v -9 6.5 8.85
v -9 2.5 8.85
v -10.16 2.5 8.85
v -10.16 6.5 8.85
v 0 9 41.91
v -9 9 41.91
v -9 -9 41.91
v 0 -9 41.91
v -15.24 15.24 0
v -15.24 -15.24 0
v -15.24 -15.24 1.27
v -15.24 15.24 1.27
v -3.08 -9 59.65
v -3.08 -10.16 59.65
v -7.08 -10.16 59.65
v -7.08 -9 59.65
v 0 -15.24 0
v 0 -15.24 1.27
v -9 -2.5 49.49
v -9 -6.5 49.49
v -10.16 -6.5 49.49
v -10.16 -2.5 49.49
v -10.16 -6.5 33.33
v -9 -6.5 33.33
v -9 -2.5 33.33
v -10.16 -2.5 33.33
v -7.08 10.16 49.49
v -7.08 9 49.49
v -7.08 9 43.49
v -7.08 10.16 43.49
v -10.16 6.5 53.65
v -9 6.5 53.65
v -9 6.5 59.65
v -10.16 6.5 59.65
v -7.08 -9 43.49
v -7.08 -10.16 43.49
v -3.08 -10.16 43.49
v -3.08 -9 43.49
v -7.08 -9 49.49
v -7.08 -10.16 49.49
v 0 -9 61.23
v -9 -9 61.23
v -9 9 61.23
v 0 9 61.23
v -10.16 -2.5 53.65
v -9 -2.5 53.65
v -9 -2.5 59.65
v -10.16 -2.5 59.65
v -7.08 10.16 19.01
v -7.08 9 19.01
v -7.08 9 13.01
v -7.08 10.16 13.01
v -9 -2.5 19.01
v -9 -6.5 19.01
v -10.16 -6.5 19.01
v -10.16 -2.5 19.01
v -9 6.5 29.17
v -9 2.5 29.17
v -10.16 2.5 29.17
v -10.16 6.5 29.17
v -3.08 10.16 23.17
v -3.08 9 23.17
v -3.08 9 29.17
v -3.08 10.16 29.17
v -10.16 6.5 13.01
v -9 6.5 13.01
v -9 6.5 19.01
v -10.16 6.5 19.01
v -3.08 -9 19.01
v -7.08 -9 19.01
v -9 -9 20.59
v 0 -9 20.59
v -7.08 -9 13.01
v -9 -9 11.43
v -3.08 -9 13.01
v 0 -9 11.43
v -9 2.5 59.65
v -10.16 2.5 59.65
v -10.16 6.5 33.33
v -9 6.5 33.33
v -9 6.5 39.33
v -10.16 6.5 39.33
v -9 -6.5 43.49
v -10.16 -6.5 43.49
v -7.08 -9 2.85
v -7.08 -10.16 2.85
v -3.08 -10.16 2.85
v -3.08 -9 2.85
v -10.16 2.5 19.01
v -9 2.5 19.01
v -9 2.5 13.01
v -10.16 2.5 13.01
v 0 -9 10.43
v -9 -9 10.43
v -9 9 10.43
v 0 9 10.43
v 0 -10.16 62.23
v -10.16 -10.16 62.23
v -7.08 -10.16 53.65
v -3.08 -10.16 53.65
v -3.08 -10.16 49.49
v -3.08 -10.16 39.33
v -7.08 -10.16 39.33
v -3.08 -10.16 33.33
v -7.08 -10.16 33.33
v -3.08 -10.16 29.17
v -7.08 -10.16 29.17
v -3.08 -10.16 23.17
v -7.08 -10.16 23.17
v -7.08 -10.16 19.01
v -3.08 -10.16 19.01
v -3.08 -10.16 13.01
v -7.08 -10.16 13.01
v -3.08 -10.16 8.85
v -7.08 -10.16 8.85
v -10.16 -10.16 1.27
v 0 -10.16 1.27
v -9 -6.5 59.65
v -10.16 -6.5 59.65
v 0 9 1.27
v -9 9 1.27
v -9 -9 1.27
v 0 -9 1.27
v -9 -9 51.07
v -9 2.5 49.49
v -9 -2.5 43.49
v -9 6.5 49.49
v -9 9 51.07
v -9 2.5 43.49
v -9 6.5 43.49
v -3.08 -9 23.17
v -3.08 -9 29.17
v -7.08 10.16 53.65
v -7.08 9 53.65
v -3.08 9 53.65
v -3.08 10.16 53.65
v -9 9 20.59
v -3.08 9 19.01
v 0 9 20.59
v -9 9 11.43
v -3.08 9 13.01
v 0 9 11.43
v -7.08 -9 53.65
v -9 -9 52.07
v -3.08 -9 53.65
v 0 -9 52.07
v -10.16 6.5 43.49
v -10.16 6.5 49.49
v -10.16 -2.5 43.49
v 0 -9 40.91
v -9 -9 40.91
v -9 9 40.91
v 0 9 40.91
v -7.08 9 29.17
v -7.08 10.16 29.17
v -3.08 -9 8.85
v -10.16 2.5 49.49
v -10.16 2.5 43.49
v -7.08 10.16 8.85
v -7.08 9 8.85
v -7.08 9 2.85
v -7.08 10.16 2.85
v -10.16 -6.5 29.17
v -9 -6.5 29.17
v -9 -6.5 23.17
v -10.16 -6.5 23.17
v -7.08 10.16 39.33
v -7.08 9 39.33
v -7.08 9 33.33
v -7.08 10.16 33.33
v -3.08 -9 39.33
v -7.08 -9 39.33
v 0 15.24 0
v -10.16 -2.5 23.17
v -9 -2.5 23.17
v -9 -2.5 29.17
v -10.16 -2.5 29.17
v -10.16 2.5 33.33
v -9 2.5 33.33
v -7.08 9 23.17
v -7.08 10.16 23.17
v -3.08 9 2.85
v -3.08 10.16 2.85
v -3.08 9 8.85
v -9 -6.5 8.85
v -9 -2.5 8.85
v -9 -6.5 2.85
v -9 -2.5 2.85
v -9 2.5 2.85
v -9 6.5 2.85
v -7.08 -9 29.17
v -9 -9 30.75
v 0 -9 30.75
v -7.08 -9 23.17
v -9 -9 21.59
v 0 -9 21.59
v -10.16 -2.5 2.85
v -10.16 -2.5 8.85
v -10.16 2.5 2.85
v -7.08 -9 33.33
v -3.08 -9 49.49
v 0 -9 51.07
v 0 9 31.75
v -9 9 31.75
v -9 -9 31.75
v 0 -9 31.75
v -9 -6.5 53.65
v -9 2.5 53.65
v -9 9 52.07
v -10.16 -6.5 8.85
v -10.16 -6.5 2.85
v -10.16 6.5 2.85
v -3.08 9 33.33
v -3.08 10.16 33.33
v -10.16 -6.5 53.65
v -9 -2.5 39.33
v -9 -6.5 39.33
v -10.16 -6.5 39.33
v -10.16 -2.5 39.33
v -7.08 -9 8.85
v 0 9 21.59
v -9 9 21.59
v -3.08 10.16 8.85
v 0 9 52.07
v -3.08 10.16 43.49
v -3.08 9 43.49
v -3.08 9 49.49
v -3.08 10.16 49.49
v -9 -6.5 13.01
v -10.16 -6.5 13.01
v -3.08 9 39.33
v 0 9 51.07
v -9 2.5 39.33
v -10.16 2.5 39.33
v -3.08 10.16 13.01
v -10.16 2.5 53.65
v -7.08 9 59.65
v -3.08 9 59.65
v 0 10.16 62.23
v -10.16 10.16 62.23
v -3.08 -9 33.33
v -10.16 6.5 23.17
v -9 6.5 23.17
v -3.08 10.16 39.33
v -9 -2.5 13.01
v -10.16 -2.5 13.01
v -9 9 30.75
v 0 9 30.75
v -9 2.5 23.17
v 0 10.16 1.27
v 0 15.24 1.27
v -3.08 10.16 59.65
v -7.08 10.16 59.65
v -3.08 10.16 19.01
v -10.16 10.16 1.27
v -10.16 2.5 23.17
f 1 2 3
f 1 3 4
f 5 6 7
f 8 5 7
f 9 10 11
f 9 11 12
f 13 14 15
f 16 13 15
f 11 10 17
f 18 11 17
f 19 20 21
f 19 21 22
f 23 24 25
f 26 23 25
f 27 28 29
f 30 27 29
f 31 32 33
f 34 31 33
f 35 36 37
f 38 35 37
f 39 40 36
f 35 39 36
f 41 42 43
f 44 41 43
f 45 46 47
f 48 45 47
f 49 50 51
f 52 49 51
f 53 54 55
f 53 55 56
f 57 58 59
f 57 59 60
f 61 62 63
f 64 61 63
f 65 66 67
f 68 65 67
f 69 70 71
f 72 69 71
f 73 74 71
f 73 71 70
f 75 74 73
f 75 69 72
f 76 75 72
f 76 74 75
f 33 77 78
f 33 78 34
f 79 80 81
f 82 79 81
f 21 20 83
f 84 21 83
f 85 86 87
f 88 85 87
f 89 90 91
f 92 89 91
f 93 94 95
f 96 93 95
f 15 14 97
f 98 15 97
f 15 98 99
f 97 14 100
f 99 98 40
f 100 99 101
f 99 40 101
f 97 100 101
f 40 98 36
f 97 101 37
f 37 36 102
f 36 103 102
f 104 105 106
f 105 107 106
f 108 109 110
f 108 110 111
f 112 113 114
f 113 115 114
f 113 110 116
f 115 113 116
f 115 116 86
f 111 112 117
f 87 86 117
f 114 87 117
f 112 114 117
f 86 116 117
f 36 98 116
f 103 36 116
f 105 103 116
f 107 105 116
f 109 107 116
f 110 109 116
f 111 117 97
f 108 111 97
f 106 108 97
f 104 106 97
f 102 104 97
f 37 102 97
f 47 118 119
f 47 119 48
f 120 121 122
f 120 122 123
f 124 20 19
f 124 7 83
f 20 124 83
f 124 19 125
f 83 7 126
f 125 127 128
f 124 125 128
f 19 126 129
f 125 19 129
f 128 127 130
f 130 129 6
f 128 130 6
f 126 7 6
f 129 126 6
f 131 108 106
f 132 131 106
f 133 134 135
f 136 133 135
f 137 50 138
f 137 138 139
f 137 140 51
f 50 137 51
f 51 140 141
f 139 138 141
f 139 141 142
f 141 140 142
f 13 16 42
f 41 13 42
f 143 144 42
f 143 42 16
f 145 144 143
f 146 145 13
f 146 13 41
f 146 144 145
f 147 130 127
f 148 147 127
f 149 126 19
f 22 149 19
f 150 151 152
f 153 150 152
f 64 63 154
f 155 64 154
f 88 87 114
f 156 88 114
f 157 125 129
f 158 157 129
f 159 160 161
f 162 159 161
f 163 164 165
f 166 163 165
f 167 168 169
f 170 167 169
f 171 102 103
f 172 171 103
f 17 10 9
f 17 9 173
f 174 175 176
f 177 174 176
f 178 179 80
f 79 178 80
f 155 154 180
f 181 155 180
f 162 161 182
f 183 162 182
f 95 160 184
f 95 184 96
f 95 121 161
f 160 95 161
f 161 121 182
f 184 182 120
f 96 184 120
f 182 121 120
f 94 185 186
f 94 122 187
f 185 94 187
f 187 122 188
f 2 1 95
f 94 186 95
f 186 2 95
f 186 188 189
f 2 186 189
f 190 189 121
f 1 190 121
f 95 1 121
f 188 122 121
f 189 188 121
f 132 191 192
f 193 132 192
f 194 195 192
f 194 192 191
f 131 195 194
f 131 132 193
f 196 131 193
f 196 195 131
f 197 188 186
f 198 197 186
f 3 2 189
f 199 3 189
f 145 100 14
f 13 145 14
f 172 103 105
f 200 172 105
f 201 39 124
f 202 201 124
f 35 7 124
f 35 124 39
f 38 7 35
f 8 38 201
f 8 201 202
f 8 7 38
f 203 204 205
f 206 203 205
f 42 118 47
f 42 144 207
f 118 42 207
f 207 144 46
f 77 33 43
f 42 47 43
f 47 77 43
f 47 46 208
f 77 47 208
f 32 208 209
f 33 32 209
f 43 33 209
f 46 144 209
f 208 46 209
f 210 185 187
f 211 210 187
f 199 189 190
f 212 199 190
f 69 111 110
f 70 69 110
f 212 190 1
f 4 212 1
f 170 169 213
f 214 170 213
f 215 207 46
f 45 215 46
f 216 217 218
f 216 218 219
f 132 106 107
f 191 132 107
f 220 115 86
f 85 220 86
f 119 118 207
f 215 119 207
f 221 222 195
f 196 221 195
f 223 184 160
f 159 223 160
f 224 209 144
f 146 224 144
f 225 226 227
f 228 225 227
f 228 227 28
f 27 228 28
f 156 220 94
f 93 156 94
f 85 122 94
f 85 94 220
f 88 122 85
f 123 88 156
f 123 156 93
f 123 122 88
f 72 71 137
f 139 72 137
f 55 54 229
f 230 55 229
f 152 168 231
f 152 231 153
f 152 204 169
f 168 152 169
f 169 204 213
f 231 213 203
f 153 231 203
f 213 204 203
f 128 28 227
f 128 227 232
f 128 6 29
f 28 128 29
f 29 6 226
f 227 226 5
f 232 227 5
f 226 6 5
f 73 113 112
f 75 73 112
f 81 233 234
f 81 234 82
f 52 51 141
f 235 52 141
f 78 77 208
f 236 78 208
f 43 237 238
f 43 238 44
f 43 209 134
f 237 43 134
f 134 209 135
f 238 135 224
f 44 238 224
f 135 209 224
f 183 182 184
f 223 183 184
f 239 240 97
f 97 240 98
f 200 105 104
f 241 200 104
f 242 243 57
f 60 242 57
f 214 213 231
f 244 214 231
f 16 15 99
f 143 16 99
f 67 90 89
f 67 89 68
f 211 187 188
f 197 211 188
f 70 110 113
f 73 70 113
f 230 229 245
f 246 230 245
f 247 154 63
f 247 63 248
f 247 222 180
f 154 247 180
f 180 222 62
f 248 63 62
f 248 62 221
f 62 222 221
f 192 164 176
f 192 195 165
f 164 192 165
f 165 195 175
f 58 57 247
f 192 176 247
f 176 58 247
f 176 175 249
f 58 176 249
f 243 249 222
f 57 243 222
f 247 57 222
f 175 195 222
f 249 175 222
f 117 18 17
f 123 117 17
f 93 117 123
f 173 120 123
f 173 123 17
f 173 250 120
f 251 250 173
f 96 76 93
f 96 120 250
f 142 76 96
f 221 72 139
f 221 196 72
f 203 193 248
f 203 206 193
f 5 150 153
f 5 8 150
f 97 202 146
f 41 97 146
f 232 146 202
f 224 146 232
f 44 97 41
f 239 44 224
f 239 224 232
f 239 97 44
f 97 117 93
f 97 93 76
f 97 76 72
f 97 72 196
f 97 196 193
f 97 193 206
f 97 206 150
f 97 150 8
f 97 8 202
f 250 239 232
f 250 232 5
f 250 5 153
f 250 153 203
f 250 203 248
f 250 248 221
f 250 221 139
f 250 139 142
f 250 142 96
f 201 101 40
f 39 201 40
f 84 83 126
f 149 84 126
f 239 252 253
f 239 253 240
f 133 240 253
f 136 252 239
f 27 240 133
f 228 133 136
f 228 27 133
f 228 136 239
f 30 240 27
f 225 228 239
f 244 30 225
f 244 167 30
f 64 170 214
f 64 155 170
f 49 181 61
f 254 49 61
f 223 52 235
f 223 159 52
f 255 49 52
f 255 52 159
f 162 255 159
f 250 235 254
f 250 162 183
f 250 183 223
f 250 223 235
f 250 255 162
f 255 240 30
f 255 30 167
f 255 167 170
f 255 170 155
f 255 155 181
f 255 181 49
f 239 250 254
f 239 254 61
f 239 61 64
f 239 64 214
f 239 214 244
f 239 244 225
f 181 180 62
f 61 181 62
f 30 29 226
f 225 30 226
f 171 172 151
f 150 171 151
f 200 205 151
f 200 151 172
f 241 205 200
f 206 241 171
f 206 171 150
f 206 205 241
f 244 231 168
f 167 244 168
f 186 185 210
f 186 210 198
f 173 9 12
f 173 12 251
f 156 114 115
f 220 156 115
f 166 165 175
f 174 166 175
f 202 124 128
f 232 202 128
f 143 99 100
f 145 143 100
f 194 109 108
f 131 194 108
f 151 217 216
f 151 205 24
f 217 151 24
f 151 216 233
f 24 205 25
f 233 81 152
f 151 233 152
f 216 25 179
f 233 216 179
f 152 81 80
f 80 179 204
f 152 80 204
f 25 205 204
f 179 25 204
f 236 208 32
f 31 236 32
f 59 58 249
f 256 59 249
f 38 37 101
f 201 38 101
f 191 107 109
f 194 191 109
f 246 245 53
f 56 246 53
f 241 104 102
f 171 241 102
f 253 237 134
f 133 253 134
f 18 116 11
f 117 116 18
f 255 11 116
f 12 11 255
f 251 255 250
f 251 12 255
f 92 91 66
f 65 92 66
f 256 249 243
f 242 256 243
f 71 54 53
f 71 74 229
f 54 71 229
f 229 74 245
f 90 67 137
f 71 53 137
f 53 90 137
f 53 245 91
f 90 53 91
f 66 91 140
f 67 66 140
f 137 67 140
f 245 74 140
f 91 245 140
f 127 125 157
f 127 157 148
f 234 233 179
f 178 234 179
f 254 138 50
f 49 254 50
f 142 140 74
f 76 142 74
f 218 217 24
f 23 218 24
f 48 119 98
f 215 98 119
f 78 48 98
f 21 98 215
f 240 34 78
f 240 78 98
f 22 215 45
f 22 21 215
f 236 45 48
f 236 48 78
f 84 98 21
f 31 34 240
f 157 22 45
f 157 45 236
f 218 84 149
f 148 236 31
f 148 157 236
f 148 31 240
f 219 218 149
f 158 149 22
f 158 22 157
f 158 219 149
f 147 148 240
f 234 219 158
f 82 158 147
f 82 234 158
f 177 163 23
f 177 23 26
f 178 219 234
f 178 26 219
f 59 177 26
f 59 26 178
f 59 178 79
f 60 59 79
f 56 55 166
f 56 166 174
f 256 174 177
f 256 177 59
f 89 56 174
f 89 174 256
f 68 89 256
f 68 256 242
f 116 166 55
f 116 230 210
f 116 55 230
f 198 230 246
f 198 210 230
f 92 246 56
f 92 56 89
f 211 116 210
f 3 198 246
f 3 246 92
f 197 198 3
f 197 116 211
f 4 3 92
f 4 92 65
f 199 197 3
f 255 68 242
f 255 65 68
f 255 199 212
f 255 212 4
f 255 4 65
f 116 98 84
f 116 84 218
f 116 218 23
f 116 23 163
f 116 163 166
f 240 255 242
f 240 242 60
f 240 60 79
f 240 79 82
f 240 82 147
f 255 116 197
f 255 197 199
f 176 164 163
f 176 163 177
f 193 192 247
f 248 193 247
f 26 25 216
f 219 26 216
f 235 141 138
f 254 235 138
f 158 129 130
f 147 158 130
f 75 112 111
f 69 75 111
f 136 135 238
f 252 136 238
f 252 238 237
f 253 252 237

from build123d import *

# Parameters (mm, degrees)
F0_W      = 30.48
F0_H      = 30.48
F1_DEPTH  = 1.27
F2_W      = 20.32
F2_H      = 20.32
F2_W_2    = 18
F2_H_2    = 18
F3_DEPTH  = 60.96
F5_DEPTH  = 74.4
F6_W      = 9
F6_H      = 1
F7_DEPTH  = 9
F8_W      = 4
F8_H      = 3
F9_DEPTH  = 53.6
F11_DEPTH = 68.5


with BuildPart() as f1:
    # F0 (on Top) → F1 (new body)
    with BuildSketch(Plane.XY):
        Rectangle(F0_W, F0_H)
    extrude(amount=F1_DEPTH)

    # F2 (on face) → F3 (join)
    with BuildSketch(Plane.XY.offset(1.27)):
        Rectangle(F2_W, F2_H)
        Rectangle(F2_W_2, F2_H_2, mode=Mode.SUBTRACT)
    extrude(amount=F3_DEPTH)

    # F4 (on Top) → F5 (cut)
    with BuildSketch(Plane.XY):
        Polygon((0, 23.4475191683), (0, -30.1982481033), (25.5301650614, -30.3230863065), (25.5301650614, 23.4475191683), align=None)
    extrude(amount=F5_DEPTH, mode=Mode.SUBTRACT)

    # F6 (on face) → F7 (join)
    with BuildSketch(Plane.YZ.offset(-9)):
        with Locations((-4.5, 10.93)):
            Rectangle(F6_W, F6_H)
        with Locations((-4.5, 61.73)):
            Rectangle(F6_W, F6_H)
        with Locations((4.5, 61.73)):
            Rectangle(F6_W, F6_H)
        with Locations((-4.5, 51.57)):
            Rectangle(F6_W, F6_H)
        with Locations((4.5, 51.57)):
            Rectangle(F6_W, F6_H)
        with Locations((-4.5, 41.41)):
            Rectangle(F6_W, F6_H)
        with Locations((4.5, 41.41)):
            Rectangle(F6_W, F6_H)
        with Locations((-4.5, 31.25)):
            Rectangle(F6_W, F6_H)
        with Locations((4.5, 31.25)):
            Rectangle(F6_W, F6_H)
        with Locations((-4.5, 21.09)):
            Rectangle(F6_W, F6_H)
        with Locations((4.5, 21.09)):
            Rectangle(F6_W, F6_H)
        with Locations((4.5, 10.93)):
            Rectangle(F6_W, F6_H)
    extrude(amount=F7_DEPTH)

    # F8 (on face) → F9 (cut)
    with BuildSketch(Plane.YZ):
        with Locations((4.5, 7.35)):
            Rectangle(F8_W, F8_H)
        with Locations((4.5, 4.35)):
            Rectangle(F8_W, F8_H)
        with Locations((-4.5, 4.35)):
            Rectangle(F8_W, F8_H)
        with Locations((-4.5, 7.35)):
            Rectangle(F8_W, F8_H)
        with Locations((-4.5, 14.51)):
            Rectangle(F8_W, F8_H)
        with Locations((-4.5, 17.51)):
            Rectangle(F8_W, F8_H)
        with Locations((-4.5, 24.67)):
            Rectangle(F8_W, F8_H)
        with Locations((-4.5, 27.67)):
            Rectangle(F8_W, F8_H)
        with Locations((4.5, 27.67)):
            Rectangle(F8_W, F8_H)
        with Locations((4.5, 24.67)):
            Rectangle(F8_W, F8_H)
        with Locations((4.5, 17.51)):
            Rectangle(F8_W, F8_H)
        with Locations((4.5, 14.51)):
            Rectangle(F8_W, F8_H)
        with Locations((4.5, 34.83)):
            Rectangle(F8_W, F8_H)
        with Locations((-4.5, 34.83)):
            Rectangle(F8_W, F8_H)
        with Locations((-4.5, 37.83)):
            Rectangle(F8_W, F8_H)
        with Locations((4.5, 37.83)):
            Rectangle(F8_W, F8_H)
        with Locations((-4.5, 55.15)):
            Rectangle(F8_W, F8_H)
        with Locations((-4.5, 58.15)):
            Rectangle(F8_W, F8_H)
        with Locations((4.5, 58.15)):
            Rectangle(F8_W, F8_H)
        with Locations((4.5, 55.15)):
            Rectangle(F8_W, F8_H)
        with Locations((4.5, 47.99)):
            Rectangle(F8_W, F8_H)
        with Locations((4.5, 44.99)):
            Rectangle(F8_W, F8_H)
        with Locations((-4.5, 44.99)):
            Rectangle(F8_W, F8_H)
        with Locations((-4.5, 47.99)):
            Rectangle(F8_W, F8_H)
    extrude(amount=-F9_DEPTH, mode=Mode.SUBTRACT)

    # F10 (on face) → F11 (cut)
    with BuildSketch(Plane.XZ.offset(10.16)):
        Polygon((-7.08, 34.5268503937), (-5.08, 36.33), (-7.08, 36.33), align=None)
        Polygon((-5.08, 33.33), (-5.08, 36.33), (-7.08, 34.5268503937), (-7.08, 33.33), align=None)
        Polygon((-3.08, 34.5268503937), (-5.08, 36.33), (-5.08, 33.33), (-3.08, 33.33), align=None)
        Polygon((-3.08, 34.5268503937), (-3.08, 36.33), (-5.08, 36.33), align=None)
        Polygon((-3.08, 36.33), (-3.08, 38.1331496063), (-5.08, 36.33), align=None)
        Polygon((-5.08, 36.33), (-3.08, 38.1331496063), (-3.08, 39.33), (-5.08, 39.33), align=None)
        Polygon((-7.08, 39.33), (-7.08, 38.1331496063), (-5.08, 36.33), (-5.08, 39.33), align=None)
        Polygon((-5.08, 36.33), (-7.08, 38.1331496063), (-7.08, 36.33), align=None)
        Polygon((-3.08, 44.6868503937), (-5.08, 46.49), (-5.08, 43.49), (-3.08, 43.49), align=None)
        Polygon((-3.08, 44.6868503937), (-3.08, 46.49), (-5.08, 46.49), align=None)
        Polygon((-3.08, 46.49), (-3.08, 48.2931496063), (-5.08, 46.49), align=None)
        Polygon((-5.08, 46.49), (-3.08, 48.2931496063), (-3.08, 49.49), (-5.08, 49.49), align=None)
        Polygon((-7.08, 49.49), (-7.08, 48.2931496063), (-5.08, 46.49), (-5.08, 49.49), align=None)
        Polygon((-5.08, 46.49), (-7.08, 48.2931496063), (-7.08, 46.49), align=None)
        Polygon((-7.08, 44.6868503937), (-5.08, 46.49), (-7.08, 46.49), align=None)
        Polygon((-5.08, 43.49), (-5.08, 46.49), (-7.08, 44.6868503937), (-7.08, 43.49), align=None)
        Polygon((-5.08, 53.65), (-5.08, 56.65), (-7.08, 54.8468503937), (-7.08, 53.65), align=None)
        Polygon((-7.08, 54.8468503937), (-5.08, 56.65), (-7.08, 56.65), align=None)
        Polygon((-7.08, 56.65), (-5.08, 56.65), (-7.08, 58.4531496063), align=None)
        Polygon((-5.08, 56.65), (-5.08, 59.65), (-7.08, 59.65), (-7.08, 58.4531496063), align=None)
        Polygon((-3.08, 59.65), (-5.08, 59.65), (-5.08, 56.65), (-3.08, 58.4531496063), align=None)
        Polygon((-3.08, 58.4531496063), (-5.08, 56.65), (-3.08, 56.65), align=None)
        Polygon((-3.08, 56.65), (-5.08, 56.65), (-3.08, 54.8468503937), align=None)
        Polygon((-3.08, 54.8468503937), (-5.08, 56.65), (-5.08, 53.65), (-3.08, 53.65), align=None)
        Polygon((-3.08, 24.3668503937), (-5.08, 26.17), (-5.08, 23.17), (-3.08, 23.17), align=None)
        Polygon((-5.08, 23.17), (-5.08, 26.17), (-7.08, 24.3668503937), (-7.08, 23.17), align=None)
        Polygon((-7.08, 29.17), (-7.08, 27.9731496063), (-5.08, 26.17), (-5.08, 29.17), align=None)
        Polygon((-5.08, 26.17), (-3.08, 27.9731496063), (-3.08, 29.17), (-5.08, 29.17), align=None)
        Polygon((-3.08, 24.3668503937), (-3.08, 26.17), (-5.08, 26.17), align=None)
        Polygon((-3.08, 26.17), (-3.08, 27.9731496063), (-5.08, 26.17), align=None)
        Polygon((-5.08, 26.17), (-7.08, 27.9731496063), (-7.08, 26.17), align=None)
        Polygon((-7.08, 24.3668503937), (-5.08, 26.17), (-7.08, 26.17), align=None)
        Polygon((-7.08, 19.01), (-7.08, 17.8131496063), (-5.08, 16.01), (-5.08, 19.01), align=None)
        Polygon((-5.08, 16.01), (-7.08, 17.8131496063), (-7.08, 16.01), align=None)
        Polygon((-7.08, 14.2068503937), (-5.08, 16.01), (-7.08, 16.01), align=None)
        Polygon((-5.08, 13.01), (-5.08, 16.01), (-7.08, 14.2068503937), (-7.08, 13.01), align=None)
        Polygon((-3.08, 14.2068503937), (-5.08, 16.01), (-5.08, 13.01), (-3.08, 13.01), align=None)
        Polygon((-3.08, 14.2068503937), (-3.08, 16.01), (-5.08, 16.01), align=None)
        Polygon((-3.08, 16.01), (-3.08, 17.8131496063), (-5.08, 16.01), align=None)
        Polygon((-5.08, 16.01), (-3.08, 17.8131496063), (-3.08, 19.01), (-5.08, 19.01), align=None)
        Polygon((-7.08, 8.85), (-7.08, 7.6531496063), (-5.08, 5.85), (-5.08, 8.85), align=None)
        Polygon((-5.08, 5.85), (-3.08, 7.6531496063), (-3.08, 8.85), (-5.08, 8.85), align=None)
        Polygon((-3.08, 5.85), (-3.08, 7.6531496063), (-5.08, 5.85), align=None)
        Polygon((-3.08, 4.0468503937), (-3.08, 5.85), (-5.08, 5.85), align=None)
        Polygon((-3.08, 4.0468503937), (-5.08, 5.85), (-5.08, 2.85), (-3.08, 2.85), align=None)
        Polygon((-5.08, 2.85), (-5.08, 5.85), (-7.08, 4.0468503937), (-7.08, 2.85), align=None)
        Polygon((-7.08, 4.0468503937), (-5.08, 5.85), (-7.08, 5.85), align=None)
        Polygon((-5.08, 5.85), (-7.08, 7.6531496063), (-7.08, 5.85), align=None)
    extrude(amount=-F11_DEPTH, mode=Mode.SUBTRACT)


solid = f1.part
